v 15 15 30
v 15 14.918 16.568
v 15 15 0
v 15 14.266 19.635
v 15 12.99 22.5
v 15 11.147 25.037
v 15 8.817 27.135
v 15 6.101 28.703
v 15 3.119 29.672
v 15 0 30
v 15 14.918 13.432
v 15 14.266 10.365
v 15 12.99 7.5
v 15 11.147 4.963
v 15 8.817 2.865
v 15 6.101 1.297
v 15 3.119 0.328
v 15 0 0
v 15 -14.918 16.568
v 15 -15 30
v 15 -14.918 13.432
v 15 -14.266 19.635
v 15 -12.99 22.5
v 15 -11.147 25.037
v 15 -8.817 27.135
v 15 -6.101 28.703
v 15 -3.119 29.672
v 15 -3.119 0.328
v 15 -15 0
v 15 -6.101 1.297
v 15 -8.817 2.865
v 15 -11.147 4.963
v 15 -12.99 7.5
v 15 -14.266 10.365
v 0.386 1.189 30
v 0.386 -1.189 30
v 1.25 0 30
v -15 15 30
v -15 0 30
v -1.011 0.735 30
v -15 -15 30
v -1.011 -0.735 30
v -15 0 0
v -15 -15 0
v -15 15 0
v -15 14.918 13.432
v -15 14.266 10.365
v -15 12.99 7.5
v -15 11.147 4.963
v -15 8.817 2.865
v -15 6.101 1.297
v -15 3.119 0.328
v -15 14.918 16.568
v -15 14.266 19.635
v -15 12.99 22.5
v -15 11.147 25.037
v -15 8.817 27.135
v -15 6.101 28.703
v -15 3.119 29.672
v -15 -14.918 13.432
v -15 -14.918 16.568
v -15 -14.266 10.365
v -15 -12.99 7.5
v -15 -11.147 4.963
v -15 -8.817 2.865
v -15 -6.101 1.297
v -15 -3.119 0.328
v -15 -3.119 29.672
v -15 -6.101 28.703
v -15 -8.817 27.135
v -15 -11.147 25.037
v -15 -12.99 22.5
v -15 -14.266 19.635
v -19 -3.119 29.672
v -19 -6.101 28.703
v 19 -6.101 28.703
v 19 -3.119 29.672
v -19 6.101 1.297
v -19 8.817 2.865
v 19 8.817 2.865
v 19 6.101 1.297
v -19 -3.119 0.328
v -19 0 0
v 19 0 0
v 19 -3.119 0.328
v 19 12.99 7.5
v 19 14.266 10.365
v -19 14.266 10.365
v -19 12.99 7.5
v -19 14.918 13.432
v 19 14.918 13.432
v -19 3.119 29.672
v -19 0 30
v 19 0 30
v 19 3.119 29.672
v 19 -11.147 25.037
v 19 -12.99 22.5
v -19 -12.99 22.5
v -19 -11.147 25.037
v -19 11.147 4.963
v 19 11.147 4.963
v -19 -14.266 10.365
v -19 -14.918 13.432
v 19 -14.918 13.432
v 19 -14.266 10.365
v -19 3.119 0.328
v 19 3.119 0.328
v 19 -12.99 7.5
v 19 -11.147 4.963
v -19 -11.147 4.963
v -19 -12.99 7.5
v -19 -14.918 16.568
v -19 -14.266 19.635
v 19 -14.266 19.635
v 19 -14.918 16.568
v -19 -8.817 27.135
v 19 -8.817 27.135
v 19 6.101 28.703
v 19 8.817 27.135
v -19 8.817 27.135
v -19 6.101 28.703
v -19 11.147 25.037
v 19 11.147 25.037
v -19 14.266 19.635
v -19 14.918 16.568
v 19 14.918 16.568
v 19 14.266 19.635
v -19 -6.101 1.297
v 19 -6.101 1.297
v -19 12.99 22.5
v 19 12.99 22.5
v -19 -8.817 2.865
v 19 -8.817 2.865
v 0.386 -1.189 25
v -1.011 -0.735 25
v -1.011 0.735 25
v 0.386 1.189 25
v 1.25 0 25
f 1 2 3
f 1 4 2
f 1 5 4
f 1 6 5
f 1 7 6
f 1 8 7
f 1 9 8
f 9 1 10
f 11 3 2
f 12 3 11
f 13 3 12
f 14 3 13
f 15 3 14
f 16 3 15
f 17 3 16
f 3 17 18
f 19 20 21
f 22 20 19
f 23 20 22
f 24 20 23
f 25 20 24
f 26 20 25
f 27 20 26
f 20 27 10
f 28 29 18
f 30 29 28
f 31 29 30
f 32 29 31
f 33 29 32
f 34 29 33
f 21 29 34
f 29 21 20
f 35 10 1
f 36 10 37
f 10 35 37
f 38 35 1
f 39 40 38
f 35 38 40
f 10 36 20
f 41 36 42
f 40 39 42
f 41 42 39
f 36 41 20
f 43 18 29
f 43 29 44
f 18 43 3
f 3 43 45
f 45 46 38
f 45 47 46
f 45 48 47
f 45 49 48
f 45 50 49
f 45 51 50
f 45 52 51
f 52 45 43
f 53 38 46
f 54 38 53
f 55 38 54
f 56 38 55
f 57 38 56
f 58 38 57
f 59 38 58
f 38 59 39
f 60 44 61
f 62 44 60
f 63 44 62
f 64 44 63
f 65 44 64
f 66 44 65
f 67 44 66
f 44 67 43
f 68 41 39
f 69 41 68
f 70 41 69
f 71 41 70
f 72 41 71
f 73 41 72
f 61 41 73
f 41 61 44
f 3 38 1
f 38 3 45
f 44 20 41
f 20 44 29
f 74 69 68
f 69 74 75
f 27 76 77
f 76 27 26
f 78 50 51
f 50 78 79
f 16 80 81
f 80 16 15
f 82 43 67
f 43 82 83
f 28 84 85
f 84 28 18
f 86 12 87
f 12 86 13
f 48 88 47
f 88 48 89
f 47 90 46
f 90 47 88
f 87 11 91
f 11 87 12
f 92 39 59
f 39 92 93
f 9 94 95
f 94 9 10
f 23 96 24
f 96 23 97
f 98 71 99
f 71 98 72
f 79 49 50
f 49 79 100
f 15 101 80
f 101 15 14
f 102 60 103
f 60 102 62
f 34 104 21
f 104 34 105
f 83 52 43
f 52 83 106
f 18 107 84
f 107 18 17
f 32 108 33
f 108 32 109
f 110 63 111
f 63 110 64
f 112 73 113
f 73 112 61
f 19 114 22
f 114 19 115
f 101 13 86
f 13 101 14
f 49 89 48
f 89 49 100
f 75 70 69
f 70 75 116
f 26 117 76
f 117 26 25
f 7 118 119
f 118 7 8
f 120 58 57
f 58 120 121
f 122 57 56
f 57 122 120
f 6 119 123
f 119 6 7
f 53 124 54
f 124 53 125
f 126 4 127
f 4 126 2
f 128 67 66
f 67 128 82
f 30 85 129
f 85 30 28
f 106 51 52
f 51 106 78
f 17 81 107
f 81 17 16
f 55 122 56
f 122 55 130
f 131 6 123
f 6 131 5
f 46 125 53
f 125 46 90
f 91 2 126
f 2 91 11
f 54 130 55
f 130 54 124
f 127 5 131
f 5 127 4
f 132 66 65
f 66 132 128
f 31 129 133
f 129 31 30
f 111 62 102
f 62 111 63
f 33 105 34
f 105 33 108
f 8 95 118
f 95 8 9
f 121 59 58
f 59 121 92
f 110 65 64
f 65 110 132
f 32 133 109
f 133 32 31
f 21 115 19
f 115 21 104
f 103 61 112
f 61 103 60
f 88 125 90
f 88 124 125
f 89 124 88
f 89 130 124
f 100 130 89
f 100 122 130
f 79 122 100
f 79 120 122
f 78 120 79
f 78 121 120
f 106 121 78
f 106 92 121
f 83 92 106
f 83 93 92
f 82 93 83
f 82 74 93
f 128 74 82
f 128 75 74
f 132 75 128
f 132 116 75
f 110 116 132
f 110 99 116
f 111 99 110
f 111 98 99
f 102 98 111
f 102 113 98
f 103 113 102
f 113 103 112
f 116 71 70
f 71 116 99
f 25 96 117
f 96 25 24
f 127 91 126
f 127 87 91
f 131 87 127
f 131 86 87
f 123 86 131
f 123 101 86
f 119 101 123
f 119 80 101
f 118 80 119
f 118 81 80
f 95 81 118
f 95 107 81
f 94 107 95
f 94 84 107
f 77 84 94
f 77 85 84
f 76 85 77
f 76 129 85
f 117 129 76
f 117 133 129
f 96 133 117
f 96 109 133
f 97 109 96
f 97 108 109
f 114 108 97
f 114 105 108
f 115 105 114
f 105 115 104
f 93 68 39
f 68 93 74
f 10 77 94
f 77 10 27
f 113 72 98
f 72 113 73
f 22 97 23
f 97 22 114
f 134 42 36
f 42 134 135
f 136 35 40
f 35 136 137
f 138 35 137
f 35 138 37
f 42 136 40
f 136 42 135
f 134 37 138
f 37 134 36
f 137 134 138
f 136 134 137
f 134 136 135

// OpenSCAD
cube_size = 30; // [10:Small,20:Medium,30:Large]

hole_diameter = 2.5; 
hole_radius = hole_diameter/2;

// How deep should the center hole be?
hole_depth = 5; // [0,1,5,50]

show_wheels = "yes"; // [yes,no]

// How thick should the side wheels be?
wheel_thickness = 4; // [1:40]

// ignore this variable!
// foo=1;

// don't turn functions into params!
function BEZ03(u) = pow((1-u), 3);

// ignore variable values
bing = 3+4;
baz = 3 / hole_depth;

difference() {
  union() {
    translate([0, 0, cube_size/2]) cube([cube_size,cube_size,cube_size], center=true);
    if (show_wheels == "yes") {
      translate([0, 0, cube_size/2]) rotate([0, 90, 0]) {
        cylinder(r=cube_size/2, h=cube_size+(wheel_thickness*2), center=true);
      }
    }
  }
  translate([0, 0, cube_size-hole_depth]) cylinder(r=hole_radius, h=hole_depth);
}
        
